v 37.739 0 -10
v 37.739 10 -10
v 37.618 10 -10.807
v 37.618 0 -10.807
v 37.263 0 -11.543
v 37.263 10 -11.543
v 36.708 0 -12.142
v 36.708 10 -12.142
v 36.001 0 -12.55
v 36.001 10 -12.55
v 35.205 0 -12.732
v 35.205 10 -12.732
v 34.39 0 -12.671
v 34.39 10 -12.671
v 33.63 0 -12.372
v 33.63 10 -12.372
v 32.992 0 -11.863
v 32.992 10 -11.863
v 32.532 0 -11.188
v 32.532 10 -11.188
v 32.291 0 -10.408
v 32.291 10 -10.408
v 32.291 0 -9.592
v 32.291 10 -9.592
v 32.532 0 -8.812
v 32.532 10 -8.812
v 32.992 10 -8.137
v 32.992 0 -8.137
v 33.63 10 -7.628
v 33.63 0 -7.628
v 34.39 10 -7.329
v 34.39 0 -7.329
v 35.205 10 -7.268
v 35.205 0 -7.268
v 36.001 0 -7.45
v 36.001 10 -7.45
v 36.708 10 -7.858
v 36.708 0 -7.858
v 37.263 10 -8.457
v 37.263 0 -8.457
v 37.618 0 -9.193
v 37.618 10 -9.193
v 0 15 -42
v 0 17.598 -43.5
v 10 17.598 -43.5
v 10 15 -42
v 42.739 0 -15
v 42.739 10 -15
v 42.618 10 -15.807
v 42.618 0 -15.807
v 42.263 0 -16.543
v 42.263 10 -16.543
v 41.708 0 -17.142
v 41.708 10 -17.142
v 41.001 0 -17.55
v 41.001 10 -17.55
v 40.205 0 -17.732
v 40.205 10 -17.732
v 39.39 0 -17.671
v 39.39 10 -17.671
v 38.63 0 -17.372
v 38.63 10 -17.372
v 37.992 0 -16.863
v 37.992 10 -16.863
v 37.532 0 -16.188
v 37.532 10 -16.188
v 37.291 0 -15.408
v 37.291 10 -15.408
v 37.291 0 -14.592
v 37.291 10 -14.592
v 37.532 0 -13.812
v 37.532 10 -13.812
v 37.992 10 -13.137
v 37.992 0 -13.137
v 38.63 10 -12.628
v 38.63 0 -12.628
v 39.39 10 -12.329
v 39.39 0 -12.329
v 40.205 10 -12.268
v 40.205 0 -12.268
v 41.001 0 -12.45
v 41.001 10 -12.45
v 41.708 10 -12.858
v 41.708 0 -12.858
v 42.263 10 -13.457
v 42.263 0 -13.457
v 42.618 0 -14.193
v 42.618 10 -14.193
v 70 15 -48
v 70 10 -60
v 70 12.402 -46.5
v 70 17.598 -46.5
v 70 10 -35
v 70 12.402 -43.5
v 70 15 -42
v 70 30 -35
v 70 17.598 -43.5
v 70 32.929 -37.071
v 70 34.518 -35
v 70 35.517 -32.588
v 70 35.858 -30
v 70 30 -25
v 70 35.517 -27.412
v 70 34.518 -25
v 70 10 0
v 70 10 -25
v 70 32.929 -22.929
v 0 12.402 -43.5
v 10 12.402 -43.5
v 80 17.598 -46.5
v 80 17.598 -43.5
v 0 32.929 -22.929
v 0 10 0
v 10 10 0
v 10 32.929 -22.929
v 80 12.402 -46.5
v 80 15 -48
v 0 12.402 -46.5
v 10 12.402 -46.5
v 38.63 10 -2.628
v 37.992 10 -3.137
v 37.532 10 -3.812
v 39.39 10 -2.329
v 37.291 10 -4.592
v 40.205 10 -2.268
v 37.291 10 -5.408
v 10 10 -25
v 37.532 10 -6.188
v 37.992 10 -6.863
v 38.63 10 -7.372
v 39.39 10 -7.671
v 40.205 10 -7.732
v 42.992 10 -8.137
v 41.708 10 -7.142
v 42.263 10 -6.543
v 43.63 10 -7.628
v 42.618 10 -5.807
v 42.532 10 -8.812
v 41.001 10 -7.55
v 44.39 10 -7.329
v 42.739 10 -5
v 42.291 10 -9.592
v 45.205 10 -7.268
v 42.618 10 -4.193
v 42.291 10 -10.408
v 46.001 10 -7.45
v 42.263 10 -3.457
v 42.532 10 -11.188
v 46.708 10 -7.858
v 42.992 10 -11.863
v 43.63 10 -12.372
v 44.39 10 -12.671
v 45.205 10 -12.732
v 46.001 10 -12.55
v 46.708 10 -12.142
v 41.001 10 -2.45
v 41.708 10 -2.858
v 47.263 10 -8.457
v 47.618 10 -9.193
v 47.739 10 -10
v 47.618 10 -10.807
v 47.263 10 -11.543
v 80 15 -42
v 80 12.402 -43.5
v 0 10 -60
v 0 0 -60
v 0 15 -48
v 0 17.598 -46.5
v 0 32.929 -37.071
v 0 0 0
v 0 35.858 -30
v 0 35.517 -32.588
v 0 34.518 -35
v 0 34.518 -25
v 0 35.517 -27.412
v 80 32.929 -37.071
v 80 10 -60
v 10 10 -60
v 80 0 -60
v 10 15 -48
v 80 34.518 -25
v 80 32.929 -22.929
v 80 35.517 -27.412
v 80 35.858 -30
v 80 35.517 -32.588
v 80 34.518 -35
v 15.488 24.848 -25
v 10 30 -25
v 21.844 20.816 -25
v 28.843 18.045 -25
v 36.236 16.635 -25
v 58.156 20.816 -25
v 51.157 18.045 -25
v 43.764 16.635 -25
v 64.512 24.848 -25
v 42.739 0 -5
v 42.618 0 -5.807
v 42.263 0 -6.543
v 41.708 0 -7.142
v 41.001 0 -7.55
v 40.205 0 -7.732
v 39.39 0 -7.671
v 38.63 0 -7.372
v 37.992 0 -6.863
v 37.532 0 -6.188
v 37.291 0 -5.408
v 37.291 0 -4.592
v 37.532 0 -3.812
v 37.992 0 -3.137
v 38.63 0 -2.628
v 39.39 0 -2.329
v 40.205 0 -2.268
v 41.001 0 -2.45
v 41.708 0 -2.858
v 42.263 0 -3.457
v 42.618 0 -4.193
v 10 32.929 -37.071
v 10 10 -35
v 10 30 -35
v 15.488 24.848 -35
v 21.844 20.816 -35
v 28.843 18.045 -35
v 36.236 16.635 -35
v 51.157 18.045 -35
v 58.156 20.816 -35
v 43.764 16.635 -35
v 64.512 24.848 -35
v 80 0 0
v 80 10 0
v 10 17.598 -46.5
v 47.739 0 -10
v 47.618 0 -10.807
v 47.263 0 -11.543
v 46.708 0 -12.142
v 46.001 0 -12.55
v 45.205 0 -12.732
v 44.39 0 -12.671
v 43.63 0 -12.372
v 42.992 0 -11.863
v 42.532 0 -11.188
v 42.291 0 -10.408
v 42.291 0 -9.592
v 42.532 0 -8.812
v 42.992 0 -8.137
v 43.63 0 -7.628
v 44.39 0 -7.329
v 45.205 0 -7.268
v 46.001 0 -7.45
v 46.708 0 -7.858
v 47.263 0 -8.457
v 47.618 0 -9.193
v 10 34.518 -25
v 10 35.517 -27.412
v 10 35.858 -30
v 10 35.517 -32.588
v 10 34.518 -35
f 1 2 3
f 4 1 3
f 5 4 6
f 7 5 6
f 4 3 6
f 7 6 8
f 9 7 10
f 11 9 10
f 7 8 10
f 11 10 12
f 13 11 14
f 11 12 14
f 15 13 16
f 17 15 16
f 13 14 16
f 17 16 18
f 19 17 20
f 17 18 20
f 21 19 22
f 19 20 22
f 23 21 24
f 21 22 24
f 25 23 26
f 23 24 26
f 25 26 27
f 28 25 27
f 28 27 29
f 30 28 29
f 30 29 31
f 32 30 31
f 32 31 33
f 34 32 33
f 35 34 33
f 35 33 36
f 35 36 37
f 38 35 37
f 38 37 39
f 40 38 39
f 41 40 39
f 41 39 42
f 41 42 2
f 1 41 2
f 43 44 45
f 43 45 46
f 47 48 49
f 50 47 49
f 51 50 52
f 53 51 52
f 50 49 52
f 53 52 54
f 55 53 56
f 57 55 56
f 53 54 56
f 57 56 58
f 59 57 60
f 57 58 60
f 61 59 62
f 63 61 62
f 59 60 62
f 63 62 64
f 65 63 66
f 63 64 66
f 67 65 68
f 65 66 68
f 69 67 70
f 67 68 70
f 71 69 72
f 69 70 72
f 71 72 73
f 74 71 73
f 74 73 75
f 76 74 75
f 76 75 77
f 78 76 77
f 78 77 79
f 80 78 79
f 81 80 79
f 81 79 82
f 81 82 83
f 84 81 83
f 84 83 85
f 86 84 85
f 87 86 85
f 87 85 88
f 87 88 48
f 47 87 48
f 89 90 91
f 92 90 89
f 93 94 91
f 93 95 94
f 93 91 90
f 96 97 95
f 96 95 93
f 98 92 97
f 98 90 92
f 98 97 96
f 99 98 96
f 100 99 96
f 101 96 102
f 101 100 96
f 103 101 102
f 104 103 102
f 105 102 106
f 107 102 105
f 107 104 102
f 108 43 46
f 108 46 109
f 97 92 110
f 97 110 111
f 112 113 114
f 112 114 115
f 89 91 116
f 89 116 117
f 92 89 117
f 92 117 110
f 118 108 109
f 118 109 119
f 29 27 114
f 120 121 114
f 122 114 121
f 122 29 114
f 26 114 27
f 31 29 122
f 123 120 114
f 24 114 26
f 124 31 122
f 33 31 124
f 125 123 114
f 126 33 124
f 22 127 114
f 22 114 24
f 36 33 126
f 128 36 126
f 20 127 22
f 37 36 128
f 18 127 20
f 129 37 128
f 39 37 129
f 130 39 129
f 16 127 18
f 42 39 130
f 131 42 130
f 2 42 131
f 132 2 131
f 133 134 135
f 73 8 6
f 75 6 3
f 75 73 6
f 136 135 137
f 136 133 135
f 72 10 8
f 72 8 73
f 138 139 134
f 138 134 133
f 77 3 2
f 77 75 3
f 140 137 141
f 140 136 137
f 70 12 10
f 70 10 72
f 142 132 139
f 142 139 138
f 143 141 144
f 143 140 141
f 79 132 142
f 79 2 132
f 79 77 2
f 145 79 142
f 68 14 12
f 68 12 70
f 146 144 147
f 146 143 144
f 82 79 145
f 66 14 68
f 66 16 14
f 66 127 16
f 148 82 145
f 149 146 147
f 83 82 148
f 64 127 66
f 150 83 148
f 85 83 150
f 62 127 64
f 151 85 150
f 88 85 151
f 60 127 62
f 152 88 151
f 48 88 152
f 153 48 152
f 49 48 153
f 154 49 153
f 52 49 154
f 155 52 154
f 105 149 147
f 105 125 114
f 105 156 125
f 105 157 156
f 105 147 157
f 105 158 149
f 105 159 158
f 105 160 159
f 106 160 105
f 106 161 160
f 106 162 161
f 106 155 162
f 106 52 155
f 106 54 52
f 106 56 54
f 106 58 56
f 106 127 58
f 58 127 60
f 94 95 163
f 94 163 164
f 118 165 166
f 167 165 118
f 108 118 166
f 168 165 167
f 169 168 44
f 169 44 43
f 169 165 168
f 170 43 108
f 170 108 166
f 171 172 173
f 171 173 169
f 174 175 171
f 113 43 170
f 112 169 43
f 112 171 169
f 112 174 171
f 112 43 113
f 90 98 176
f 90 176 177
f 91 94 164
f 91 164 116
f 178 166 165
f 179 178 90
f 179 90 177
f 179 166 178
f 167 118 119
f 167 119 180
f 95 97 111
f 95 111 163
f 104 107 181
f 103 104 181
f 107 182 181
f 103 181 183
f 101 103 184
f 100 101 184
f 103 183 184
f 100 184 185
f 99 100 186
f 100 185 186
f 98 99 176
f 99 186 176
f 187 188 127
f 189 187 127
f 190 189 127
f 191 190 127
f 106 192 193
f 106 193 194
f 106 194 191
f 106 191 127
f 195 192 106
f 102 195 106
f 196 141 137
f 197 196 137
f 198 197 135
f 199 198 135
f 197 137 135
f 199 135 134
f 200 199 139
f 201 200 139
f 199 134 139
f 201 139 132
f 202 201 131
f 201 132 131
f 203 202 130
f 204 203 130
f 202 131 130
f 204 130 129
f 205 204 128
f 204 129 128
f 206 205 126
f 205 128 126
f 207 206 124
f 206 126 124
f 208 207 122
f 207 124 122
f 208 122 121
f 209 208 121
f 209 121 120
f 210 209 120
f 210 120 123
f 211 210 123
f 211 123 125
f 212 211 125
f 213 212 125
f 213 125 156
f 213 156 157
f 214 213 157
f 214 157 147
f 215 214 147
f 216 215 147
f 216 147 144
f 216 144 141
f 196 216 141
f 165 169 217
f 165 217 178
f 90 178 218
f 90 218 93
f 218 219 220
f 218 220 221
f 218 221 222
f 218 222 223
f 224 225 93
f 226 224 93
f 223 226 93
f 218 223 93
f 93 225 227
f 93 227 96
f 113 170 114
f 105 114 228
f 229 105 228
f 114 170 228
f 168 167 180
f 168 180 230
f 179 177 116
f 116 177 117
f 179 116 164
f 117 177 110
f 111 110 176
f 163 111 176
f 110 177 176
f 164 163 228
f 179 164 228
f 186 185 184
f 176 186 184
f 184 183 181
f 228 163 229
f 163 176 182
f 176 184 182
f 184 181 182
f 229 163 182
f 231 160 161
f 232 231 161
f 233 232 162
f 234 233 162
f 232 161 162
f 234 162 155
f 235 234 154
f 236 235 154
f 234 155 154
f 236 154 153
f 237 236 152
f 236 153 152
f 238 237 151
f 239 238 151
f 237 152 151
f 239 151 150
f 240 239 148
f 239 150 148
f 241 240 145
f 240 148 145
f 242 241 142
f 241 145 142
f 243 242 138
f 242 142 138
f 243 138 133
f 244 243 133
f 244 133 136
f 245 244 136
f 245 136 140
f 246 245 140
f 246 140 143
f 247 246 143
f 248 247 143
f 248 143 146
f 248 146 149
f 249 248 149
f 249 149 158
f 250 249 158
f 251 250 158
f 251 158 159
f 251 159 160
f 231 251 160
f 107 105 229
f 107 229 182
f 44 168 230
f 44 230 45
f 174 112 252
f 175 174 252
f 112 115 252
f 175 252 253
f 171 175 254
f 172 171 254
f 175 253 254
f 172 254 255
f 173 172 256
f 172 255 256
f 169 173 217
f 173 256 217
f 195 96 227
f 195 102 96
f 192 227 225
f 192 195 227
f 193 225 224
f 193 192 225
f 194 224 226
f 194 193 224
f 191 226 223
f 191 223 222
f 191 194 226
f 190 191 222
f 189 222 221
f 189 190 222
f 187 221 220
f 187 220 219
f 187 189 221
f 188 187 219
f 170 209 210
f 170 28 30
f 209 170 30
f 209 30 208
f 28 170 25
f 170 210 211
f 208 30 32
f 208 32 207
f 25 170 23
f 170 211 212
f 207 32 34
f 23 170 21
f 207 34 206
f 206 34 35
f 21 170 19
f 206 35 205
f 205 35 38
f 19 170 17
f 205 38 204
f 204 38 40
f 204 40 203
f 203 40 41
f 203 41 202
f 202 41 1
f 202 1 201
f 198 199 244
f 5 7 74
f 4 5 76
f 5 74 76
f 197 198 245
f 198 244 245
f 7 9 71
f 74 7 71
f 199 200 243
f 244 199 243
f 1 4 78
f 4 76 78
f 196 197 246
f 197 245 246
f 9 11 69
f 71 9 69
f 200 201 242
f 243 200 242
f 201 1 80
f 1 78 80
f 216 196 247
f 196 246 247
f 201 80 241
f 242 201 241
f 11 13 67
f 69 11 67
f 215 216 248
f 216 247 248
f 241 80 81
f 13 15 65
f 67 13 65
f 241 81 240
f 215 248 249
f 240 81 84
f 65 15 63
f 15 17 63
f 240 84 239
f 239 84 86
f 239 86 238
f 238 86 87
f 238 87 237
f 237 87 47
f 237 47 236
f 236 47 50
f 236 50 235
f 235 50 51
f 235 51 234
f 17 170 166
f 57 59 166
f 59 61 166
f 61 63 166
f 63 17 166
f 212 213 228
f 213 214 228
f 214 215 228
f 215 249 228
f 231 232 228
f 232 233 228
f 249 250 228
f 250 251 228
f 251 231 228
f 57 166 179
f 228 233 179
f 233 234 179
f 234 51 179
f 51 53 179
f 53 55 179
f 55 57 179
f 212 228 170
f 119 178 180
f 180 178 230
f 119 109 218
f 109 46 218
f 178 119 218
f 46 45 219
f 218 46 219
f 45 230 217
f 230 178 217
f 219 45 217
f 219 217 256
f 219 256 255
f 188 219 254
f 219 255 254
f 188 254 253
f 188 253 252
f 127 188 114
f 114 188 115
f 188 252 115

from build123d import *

# Parameters (mm, degrees)
SKETCH1_W           = 80
SKETCH1_H           = 60
BOSS_EXTRUDE1_DEPTH = 10
BOSS_EXTRUDE2_DEPTH = 10
LPATTERN1_COUNT     = 2
LPATTERN1_PITCH     = 70
BOSS_EXTRUDE3_START = -30
BOSS_EXTRUDE3_DEPTH = 5
FILLET1_R           = 10
SKETCH4_R           = 2.739205113
CUT_EXTRUDE1_DEPTH  = 11
CUT_EXTRUDE2_DEPTH  = 81


with BuildPart() as part:
    # Sketch1 → Boss-Extrude1 (new body)
    with BuildSketch(Plane(origin=(0, 0, 0), x_dir=(1, 0, 0), z_dir=(0, 1, 0))):
        with Locations((40, 30)):
            Rectangle(SKETCH1_W, SKETCH1_H)
    extrude(amount=BOSS_EXTRUDE1_DEPTH)

    # Sketch2 → Boss-Extrude2 (add)
    with BuildSketch(Plane(origin=(0, 0, 0), x_dir=(0, 0, -1), z_dir=(1, 0, 0))):
        Polygon((0, 10), (30, 40), (60, 10), align=None)
    boss_extrude2 = extrude(amount=BOSS_EXTRUDE2_DEPTH)

    # LPattern1: Boss-Extrude2 ×2
    with Locations(*[(i * LPATTERN1_PITCH, 0, 0) for i in range(1, LPATTERN1_COUNT)]):
        add(boss_extrude2)

    # Sketch3 → Boss-Extrude3 (add, symmetric)
    with BuildSketch(Plane.XY.offset(BOSS_EXTRUDE3_START)):
        with BuildLine():
            Line((10, 30), (10, 10))
            Line((10, 10), (70, 10))
            Line((70, 10), (70, 30))
            ThreePointArc((70, 30), (40, 16.457513111), (10, 30))
        make_face()
    extrude(amount=BOSS_EXTRUDE3_DEPTH, both=True)

    # Fillet1
    fillet1_edges = [part.edges().sort_by_distance(p)[0] for p in [
        (5, 40, -30),
        (75, 40, -30),
    ]]
    fillet(fillet1_edges, radius=FILLET1_R)

    # Sketch4 → Cut-Extrude1 (cut, through all)
    with BuildSketch(Plane(origin=(0, 10, 0), x_dir=(1, 0, 0), z_dir=(0, 1, 0))):
        with Locations((40, 15)):
            Circle(SKETCH4_R)
        with Locations((45, 10)):
            Circle(SKETCH4_R)
        with Locations((40, 5)):
            Circle(SKETCH4_R)
        with Locations((35, 10)):
            Circle(SKETCH4_R)
    extrude(amount=-CUT_EXTRUDE1_DEPTH, mode=Mode.SUBTRACT)

    # Sketch5 → Cut-Extrude2 (cut, through all)
    with BuildSketch(Plane(origin=(0, 0, 0), x_dir=(0, 0, -1), z_dir=(1, 0, 0))):
        Polygon((46.5, 12.401923789), (48, 15), (46.5, 17.598076211), (43.5, 17.598076211), (42, 15), (43.5, 12.401923789), align=None)
    extrude(amount=CUT_EXTRUDE2_DEPTH, mode=Mode.SUBTRACT)


solid = part.part
